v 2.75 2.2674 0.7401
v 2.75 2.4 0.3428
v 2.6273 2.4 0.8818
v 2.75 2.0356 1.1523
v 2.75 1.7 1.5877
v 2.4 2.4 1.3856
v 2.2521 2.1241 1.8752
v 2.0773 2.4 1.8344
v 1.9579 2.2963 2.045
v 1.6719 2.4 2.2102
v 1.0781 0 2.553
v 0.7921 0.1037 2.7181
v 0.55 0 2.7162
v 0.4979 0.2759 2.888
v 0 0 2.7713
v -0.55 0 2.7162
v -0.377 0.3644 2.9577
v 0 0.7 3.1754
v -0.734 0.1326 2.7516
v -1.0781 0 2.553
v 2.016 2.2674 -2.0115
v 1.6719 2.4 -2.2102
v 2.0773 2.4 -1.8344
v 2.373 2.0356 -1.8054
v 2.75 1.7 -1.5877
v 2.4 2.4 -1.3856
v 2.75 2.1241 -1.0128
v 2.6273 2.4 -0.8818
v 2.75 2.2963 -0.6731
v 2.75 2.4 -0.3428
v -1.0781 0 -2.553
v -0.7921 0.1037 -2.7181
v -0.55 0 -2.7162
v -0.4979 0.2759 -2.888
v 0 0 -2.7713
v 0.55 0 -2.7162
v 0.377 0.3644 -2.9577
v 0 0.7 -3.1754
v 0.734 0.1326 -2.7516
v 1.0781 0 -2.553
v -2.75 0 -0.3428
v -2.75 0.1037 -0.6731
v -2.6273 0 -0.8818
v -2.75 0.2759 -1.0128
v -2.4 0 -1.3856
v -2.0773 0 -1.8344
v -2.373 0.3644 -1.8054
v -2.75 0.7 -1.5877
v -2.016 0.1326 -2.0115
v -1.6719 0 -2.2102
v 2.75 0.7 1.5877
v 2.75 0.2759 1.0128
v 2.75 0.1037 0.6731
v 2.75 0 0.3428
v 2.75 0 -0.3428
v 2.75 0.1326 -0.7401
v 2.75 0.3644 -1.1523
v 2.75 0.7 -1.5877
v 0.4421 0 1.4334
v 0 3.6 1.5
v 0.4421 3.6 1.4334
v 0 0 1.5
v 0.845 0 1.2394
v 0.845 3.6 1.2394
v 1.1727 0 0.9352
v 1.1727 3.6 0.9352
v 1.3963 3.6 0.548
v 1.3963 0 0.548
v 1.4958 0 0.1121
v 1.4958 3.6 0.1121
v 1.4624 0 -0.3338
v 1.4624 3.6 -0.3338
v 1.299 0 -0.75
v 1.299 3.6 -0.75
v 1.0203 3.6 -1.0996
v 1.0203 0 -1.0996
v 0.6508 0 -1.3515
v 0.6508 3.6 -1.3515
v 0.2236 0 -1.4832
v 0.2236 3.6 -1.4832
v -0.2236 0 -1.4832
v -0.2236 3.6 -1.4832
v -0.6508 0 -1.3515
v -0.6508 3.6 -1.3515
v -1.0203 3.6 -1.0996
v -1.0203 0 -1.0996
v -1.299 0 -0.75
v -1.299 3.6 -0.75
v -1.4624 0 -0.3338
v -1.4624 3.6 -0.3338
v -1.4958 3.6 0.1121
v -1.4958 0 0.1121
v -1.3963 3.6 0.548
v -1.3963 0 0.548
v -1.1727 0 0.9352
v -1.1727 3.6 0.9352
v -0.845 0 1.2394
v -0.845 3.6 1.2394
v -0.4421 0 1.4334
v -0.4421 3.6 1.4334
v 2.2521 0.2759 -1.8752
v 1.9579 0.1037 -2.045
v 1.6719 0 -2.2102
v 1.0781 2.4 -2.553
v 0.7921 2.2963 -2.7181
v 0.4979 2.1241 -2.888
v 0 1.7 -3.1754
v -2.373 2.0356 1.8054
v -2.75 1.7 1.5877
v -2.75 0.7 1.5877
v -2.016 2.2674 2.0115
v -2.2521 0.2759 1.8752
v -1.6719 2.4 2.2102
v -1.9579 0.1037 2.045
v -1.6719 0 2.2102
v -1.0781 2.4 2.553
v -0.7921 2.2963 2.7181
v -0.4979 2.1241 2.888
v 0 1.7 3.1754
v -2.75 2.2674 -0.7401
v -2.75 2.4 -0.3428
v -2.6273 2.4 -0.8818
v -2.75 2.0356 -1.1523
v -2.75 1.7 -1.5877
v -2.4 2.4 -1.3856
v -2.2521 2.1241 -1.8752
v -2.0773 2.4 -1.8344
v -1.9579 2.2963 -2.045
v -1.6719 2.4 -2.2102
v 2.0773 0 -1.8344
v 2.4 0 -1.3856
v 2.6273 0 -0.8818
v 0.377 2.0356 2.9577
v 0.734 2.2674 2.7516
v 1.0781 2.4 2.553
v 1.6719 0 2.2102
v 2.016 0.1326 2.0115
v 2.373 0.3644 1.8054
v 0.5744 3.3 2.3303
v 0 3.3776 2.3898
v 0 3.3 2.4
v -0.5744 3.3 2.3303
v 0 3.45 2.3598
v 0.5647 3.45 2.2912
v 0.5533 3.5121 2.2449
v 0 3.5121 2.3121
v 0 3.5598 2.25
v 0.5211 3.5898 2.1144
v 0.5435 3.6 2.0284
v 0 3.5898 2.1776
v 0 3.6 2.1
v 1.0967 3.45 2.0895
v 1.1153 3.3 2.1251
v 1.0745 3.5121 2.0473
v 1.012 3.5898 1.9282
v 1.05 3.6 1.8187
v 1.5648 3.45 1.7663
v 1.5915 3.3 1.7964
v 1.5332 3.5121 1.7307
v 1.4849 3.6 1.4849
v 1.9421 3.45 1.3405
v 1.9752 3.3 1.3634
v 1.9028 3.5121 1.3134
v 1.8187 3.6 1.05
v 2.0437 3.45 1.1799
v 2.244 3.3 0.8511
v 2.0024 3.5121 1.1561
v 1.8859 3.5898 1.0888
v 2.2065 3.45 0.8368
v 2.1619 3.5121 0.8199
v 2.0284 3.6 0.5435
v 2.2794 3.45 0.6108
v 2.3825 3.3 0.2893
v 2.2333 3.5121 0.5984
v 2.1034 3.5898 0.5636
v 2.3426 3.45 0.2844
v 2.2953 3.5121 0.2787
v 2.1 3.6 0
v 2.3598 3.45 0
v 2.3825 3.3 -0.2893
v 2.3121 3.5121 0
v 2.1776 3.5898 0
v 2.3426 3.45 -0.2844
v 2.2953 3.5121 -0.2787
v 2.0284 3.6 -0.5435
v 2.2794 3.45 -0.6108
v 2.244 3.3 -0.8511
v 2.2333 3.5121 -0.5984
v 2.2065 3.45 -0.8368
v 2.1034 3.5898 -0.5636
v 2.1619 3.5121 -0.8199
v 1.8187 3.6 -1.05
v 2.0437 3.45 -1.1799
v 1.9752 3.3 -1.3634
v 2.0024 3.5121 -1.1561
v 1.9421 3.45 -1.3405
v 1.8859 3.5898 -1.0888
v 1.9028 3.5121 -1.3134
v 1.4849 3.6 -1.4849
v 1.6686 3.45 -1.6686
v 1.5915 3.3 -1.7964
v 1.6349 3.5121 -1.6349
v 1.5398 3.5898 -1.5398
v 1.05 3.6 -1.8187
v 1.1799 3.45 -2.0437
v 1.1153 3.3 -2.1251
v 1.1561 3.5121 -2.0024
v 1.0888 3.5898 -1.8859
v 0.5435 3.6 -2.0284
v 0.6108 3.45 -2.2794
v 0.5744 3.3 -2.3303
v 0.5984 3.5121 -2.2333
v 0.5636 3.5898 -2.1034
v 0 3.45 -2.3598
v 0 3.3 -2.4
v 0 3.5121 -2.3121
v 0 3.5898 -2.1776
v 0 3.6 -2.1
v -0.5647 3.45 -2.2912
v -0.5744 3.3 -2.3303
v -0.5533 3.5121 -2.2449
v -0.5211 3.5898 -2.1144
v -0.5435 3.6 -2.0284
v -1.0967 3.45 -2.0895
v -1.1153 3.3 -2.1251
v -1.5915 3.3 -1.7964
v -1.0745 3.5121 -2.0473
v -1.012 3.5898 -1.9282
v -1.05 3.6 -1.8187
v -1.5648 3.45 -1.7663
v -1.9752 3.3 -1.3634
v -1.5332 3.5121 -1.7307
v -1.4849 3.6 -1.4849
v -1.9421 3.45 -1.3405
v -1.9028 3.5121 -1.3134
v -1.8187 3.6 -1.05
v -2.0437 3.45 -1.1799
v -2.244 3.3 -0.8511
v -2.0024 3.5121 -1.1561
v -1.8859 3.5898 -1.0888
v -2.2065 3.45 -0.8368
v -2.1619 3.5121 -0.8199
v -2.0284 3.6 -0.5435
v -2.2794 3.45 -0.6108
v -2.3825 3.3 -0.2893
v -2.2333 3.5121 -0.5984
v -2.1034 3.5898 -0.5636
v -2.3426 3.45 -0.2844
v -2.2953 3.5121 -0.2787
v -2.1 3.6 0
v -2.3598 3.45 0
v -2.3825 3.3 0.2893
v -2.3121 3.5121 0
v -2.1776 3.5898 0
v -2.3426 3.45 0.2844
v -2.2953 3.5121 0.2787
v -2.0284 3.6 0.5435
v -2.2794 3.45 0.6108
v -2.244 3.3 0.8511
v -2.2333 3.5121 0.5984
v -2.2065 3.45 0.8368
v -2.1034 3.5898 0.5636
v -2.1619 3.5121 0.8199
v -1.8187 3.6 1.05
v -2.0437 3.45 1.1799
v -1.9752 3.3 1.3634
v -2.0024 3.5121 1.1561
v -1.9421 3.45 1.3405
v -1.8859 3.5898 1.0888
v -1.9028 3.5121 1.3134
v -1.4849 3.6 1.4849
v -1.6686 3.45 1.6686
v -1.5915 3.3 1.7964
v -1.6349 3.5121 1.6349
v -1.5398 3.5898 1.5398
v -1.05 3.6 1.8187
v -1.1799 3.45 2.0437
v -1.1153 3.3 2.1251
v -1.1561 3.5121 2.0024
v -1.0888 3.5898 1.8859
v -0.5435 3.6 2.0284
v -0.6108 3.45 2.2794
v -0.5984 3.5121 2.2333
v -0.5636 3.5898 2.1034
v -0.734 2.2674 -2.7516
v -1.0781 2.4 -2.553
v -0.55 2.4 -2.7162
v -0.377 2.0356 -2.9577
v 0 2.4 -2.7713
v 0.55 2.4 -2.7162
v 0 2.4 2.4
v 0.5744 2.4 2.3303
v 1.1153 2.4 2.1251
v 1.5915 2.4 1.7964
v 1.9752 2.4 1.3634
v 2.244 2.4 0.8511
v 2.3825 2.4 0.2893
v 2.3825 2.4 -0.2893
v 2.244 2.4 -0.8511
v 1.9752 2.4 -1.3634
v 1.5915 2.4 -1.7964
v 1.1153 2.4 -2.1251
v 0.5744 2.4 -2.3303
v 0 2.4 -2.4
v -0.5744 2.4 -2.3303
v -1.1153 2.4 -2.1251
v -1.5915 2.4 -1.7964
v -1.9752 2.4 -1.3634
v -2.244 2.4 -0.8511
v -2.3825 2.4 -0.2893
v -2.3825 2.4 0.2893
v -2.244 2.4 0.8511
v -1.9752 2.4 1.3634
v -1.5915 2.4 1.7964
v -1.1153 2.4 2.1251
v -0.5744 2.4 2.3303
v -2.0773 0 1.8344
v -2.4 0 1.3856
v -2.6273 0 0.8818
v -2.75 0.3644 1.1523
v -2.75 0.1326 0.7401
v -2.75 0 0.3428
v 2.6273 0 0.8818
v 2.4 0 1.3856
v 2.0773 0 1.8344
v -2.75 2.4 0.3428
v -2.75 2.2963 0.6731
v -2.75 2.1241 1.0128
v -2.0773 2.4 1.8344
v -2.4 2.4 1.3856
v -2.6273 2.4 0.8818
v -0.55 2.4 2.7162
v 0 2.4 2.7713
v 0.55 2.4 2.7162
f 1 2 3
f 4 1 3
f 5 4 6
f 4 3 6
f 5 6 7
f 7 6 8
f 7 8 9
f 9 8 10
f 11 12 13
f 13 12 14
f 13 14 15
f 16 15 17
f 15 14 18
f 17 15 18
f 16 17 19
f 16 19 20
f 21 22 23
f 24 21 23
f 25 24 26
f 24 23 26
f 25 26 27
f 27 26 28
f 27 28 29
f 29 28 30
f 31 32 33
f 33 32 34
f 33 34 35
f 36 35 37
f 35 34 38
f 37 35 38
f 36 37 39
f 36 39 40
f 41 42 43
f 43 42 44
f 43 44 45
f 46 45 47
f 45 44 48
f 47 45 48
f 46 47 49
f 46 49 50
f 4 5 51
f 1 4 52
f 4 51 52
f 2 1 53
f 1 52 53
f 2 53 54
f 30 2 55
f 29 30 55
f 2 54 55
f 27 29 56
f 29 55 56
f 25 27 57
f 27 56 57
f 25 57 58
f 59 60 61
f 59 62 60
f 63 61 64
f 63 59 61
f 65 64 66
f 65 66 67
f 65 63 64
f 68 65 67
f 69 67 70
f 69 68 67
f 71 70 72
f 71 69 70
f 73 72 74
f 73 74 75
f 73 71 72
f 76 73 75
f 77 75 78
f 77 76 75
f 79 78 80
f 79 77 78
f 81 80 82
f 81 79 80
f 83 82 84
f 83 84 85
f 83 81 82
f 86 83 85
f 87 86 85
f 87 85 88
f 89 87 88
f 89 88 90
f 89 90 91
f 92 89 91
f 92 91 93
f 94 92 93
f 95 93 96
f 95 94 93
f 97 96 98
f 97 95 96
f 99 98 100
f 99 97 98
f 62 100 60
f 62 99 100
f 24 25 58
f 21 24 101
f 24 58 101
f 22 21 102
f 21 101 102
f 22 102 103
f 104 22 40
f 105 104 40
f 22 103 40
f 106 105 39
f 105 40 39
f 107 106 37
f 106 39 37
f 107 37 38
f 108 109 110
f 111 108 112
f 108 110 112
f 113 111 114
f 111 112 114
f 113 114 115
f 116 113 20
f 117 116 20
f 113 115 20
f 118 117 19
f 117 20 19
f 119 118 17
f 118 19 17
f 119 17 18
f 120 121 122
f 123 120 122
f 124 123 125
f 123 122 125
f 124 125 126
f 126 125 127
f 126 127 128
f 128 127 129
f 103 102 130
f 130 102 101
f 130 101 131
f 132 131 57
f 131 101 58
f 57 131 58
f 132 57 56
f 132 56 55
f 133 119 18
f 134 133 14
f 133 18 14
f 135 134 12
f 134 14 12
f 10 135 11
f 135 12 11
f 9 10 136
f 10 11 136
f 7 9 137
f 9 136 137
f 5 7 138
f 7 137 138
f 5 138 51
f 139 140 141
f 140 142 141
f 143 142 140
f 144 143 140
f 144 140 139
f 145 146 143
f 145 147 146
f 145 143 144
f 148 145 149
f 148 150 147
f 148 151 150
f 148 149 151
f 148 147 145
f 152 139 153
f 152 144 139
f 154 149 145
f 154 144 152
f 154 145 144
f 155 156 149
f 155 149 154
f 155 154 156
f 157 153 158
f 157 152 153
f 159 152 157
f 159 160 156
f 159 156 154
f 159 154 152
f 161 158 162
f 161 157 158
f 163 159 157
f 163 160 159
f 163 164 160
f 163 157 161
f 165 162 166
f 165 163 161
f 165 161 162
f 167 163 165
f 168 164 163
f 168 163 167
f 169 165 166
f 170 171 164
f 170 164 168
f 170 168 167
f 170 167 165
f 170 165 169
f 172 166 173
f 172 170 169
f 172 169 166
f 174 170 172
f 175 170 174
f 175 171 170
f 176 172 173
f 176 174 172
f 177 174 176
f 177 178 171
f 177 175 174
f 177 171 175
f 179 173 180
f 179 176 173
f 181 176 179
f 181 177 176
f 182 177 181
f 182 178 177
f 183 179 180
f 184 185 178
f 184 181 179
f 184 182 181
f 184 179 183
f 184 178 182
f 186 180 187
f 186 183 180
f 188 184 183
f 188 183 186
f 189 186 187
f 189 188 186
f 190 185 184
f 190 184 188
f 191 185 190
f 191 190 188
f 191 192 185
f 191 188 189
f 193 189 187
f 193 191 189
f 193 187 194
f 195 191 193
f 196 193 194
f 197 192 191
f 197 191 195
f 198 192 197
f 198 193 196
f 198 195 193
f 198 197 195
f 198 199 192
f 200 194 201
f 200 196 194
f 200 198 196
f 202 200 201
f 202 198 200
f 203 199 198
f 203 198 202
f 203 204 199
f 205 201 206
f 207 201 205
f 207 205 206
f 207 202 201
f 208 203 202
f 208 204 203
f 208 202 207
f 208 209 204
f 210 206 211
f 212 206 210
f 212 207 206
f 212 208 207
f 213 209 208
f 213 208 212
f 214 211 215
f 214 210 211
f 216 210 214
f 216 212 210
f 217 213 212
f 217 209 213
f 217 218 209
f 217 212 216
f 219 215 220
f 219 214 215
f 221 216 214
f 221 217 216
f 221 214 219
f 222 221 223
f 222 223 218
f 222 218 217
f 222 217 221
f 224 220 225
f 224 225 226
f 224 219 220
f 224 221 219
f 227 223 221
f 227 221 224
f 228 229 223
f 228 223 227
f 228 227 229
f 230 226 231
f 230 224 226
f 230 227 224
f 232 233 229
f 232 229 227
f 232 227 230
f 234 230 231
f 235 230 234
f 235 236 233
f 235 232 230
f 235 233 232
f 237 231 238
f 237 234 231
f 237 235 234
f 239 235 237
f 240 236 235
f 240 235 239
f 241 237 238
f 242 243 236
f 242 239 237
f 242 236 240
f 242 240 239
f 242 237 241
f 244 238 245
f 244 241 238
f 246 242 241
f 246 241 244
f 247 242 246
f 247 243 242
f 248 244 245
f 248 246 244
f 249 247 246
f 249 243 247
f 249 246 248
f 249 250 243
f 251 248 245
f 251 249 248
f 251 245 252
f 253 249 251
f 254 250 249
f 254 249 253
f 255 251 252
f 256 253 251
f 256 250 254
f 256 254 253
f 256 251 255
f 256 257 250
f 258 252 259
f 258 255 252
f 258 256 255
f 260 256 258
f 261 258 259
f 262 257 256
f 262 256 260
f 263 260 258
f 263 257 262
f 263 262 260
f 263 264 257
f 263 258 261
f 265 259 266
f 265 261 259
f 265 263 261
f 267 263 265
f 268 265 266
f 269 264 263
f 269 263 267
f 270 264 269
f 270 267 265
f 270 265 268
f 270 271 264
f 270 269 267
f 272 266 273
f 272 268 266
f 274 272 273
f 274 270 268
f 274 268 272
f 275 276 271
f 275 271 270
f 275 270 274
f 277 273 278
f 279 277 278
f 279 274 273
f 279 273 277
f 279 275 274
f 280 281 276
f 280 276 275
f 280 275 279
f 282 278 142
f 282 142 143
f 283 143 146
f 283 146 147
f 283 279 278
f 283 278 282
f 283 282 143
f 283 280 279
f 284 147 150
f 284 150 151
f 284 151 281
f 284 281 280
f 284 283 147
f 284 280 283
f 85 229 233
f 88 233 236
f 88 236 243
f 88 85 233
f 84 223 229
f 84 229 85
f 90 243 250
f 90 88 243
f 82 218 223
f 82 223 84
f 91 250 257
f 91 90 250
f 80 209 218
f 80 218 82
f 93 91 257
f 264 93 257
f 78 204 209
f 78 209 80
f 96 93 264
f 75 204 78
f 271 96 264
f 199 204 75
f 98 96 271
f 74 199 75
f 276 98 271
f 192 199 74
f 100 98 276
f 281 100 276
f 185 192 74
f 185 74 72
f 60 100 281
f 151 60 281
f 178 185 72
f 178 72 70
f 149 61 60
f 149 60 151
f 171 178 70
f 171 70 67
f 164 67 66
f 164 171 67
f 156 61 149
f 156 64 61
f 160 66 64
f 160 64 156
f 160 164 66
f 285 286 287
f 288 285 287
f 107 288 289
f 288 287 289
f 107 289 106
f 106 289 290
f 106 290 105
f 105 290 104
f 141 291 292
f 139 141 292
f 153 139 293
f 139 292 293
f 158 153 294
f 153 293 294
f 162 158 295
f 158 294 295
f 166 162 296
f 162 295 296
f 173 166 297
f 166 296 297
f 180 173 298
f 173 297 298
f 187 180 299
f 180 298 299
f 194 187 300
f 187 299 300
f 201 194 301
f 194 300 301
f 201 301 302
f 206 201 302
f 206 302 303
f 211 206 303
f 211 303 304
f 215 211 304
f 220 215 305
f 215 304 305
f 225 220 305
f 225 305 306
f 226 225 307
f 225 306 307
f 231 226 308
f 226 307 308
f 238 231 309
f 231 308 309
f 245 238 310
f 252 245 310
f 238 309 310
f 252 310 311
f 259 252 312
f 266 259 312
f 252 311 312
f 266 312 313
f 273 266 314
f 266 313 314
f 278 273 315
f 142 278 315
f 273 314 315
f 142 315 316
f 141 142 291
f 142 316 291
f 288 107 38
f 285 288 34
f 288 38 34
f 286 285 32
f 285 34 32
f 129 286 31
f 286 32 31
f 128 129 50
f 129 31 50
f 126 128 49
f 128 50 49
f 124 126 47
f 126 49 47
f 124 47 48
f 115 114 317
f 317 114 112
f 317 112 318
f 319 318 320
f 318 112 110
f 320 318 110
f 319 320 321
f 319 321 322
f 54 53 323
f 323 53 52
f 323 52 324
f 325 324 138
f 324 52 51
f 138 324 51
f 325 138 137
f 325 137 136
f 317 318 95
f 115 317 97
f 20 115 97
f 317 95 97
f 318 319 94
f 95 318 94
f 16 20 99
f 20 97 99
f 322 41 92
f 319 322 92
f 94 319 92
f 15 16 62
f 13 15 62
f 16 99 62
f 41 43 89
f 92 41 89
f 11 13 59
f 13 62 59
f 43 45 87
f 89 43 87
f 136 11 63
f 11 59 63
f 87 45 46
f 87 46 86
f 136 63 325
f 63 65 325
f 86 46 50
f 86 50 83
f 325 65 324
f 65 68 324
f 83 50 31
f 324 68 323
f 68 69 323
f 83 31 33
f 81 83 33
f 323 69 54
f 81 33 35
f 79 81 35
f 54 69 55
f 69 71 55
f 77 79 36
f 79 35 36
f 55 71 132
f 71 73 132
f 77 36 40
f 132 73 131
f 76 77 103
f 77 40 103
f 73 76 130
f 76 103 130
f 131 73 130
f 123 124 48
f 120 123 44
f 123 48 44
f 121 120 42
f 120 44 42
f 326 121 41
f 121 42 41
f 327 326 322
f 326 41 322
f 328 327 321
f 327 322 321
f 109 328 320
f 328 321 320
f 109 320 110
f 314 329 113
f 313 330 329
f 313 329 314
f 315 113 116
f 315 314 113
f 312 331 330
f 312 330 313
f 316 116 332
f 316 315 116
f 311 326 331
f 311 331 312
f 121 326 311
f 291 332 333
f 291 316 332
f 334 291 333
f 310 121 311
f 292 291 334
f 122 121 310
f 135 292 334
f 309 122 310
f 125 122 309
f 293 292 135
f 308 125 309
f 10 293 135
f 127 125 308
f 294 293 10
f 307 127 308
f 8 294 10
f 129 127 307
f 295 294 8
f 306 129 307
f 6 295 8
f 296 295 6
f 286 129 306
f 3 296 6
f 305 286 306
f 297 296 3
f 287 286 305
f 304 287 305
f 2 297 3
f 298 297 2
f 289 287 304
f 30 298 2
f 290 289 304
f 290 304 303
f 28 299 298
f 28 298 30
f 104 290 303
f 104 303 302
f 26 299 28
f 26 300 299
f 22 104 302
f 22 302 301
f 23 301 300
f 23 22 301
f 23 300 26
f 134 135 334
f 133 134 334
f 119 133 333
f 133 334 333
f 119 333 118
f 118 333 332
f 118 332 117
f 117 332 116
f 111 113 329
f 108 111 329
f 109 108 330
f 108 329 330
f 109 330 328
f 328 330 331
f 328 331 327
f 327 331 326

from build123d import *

# Parameters (mm, degrees)
SKETCH_1_R      = 1.5
EXTRUDE_1_DEPTH = 2.4
SKETCH_4_R      = 2.4
SKETCH_4_R_2    = 1.5
EXTRUDE_3_DEPTH = 1.2
FILLET_5_R      = 0.3


with BuildPart() as part:
    # 草图1 → 凸台-拉伸1 (new body)
    with BuildSketch(Plane(origin=(0, 0, 0), x_dir=(1, 0, 0), z_dir=(0, 1, 0))):
        Polygon((0, 3.175426481), (-2.75, 1.58771324), (-2.75, -1.58771324), (0, -3.175426481), (2.75, -1.58771324), (2.75, 1.58771324), align=None)
        with Locations(Location((0, 0, 0), (0, 0, 270))):
            Circle(SKETCH_1_R, mode=Mode.SUBTRACT)
    extrude(amount=EXTRUDE_1_DEPTH)

    # 草图3 → 切除-旋转7 (revolve, cut)
    with BuildSketch(Plane(origin=(0, 0, 0), x_dir=(0, 0, -1), z_dir=(1, 0, 0))):
        Polygon((0.384303775, 7.2), (4.083483307, 7.2), (4.083483307, -4.8), (0.297701235, -4.8), (0.297701235, -4.284366336), (3.464101615, 1.2), (0.384303775, 6.534366336), align=None)
    revolve(axis=Axis((0, 2.4, 0), (0, -1, 0)), mode=Mode.SUBTRACT)

    # 草图4 → 凸台-拉伸3 (add)
    with BuildSketch(Plane(origin=(0, 2.4, 0), x_dir=(1, 0, 0), z_dir=(0, 1, 0))):
        with Locations(Location((0, 0, 0), (0, 0, 270))):
            Circle(SKETCH_4_R)
        with Locations(Location((0, 0, 0), (0, 0, 270))):
            Circle(SKETCH_4_R_2, mode=Mode.SUBTRACT)
    extrude(amount=EXTRUDE_3_DEPTH)

    # 圆角5
    fillet_5_edges = [part.edges().sort_by_distance(p)[0] for p in [
        (0, 3.6, -2.4),
    ]]
    fillet(fillet_5_edges, radius=FILLET_5_R)


solid = part.part
